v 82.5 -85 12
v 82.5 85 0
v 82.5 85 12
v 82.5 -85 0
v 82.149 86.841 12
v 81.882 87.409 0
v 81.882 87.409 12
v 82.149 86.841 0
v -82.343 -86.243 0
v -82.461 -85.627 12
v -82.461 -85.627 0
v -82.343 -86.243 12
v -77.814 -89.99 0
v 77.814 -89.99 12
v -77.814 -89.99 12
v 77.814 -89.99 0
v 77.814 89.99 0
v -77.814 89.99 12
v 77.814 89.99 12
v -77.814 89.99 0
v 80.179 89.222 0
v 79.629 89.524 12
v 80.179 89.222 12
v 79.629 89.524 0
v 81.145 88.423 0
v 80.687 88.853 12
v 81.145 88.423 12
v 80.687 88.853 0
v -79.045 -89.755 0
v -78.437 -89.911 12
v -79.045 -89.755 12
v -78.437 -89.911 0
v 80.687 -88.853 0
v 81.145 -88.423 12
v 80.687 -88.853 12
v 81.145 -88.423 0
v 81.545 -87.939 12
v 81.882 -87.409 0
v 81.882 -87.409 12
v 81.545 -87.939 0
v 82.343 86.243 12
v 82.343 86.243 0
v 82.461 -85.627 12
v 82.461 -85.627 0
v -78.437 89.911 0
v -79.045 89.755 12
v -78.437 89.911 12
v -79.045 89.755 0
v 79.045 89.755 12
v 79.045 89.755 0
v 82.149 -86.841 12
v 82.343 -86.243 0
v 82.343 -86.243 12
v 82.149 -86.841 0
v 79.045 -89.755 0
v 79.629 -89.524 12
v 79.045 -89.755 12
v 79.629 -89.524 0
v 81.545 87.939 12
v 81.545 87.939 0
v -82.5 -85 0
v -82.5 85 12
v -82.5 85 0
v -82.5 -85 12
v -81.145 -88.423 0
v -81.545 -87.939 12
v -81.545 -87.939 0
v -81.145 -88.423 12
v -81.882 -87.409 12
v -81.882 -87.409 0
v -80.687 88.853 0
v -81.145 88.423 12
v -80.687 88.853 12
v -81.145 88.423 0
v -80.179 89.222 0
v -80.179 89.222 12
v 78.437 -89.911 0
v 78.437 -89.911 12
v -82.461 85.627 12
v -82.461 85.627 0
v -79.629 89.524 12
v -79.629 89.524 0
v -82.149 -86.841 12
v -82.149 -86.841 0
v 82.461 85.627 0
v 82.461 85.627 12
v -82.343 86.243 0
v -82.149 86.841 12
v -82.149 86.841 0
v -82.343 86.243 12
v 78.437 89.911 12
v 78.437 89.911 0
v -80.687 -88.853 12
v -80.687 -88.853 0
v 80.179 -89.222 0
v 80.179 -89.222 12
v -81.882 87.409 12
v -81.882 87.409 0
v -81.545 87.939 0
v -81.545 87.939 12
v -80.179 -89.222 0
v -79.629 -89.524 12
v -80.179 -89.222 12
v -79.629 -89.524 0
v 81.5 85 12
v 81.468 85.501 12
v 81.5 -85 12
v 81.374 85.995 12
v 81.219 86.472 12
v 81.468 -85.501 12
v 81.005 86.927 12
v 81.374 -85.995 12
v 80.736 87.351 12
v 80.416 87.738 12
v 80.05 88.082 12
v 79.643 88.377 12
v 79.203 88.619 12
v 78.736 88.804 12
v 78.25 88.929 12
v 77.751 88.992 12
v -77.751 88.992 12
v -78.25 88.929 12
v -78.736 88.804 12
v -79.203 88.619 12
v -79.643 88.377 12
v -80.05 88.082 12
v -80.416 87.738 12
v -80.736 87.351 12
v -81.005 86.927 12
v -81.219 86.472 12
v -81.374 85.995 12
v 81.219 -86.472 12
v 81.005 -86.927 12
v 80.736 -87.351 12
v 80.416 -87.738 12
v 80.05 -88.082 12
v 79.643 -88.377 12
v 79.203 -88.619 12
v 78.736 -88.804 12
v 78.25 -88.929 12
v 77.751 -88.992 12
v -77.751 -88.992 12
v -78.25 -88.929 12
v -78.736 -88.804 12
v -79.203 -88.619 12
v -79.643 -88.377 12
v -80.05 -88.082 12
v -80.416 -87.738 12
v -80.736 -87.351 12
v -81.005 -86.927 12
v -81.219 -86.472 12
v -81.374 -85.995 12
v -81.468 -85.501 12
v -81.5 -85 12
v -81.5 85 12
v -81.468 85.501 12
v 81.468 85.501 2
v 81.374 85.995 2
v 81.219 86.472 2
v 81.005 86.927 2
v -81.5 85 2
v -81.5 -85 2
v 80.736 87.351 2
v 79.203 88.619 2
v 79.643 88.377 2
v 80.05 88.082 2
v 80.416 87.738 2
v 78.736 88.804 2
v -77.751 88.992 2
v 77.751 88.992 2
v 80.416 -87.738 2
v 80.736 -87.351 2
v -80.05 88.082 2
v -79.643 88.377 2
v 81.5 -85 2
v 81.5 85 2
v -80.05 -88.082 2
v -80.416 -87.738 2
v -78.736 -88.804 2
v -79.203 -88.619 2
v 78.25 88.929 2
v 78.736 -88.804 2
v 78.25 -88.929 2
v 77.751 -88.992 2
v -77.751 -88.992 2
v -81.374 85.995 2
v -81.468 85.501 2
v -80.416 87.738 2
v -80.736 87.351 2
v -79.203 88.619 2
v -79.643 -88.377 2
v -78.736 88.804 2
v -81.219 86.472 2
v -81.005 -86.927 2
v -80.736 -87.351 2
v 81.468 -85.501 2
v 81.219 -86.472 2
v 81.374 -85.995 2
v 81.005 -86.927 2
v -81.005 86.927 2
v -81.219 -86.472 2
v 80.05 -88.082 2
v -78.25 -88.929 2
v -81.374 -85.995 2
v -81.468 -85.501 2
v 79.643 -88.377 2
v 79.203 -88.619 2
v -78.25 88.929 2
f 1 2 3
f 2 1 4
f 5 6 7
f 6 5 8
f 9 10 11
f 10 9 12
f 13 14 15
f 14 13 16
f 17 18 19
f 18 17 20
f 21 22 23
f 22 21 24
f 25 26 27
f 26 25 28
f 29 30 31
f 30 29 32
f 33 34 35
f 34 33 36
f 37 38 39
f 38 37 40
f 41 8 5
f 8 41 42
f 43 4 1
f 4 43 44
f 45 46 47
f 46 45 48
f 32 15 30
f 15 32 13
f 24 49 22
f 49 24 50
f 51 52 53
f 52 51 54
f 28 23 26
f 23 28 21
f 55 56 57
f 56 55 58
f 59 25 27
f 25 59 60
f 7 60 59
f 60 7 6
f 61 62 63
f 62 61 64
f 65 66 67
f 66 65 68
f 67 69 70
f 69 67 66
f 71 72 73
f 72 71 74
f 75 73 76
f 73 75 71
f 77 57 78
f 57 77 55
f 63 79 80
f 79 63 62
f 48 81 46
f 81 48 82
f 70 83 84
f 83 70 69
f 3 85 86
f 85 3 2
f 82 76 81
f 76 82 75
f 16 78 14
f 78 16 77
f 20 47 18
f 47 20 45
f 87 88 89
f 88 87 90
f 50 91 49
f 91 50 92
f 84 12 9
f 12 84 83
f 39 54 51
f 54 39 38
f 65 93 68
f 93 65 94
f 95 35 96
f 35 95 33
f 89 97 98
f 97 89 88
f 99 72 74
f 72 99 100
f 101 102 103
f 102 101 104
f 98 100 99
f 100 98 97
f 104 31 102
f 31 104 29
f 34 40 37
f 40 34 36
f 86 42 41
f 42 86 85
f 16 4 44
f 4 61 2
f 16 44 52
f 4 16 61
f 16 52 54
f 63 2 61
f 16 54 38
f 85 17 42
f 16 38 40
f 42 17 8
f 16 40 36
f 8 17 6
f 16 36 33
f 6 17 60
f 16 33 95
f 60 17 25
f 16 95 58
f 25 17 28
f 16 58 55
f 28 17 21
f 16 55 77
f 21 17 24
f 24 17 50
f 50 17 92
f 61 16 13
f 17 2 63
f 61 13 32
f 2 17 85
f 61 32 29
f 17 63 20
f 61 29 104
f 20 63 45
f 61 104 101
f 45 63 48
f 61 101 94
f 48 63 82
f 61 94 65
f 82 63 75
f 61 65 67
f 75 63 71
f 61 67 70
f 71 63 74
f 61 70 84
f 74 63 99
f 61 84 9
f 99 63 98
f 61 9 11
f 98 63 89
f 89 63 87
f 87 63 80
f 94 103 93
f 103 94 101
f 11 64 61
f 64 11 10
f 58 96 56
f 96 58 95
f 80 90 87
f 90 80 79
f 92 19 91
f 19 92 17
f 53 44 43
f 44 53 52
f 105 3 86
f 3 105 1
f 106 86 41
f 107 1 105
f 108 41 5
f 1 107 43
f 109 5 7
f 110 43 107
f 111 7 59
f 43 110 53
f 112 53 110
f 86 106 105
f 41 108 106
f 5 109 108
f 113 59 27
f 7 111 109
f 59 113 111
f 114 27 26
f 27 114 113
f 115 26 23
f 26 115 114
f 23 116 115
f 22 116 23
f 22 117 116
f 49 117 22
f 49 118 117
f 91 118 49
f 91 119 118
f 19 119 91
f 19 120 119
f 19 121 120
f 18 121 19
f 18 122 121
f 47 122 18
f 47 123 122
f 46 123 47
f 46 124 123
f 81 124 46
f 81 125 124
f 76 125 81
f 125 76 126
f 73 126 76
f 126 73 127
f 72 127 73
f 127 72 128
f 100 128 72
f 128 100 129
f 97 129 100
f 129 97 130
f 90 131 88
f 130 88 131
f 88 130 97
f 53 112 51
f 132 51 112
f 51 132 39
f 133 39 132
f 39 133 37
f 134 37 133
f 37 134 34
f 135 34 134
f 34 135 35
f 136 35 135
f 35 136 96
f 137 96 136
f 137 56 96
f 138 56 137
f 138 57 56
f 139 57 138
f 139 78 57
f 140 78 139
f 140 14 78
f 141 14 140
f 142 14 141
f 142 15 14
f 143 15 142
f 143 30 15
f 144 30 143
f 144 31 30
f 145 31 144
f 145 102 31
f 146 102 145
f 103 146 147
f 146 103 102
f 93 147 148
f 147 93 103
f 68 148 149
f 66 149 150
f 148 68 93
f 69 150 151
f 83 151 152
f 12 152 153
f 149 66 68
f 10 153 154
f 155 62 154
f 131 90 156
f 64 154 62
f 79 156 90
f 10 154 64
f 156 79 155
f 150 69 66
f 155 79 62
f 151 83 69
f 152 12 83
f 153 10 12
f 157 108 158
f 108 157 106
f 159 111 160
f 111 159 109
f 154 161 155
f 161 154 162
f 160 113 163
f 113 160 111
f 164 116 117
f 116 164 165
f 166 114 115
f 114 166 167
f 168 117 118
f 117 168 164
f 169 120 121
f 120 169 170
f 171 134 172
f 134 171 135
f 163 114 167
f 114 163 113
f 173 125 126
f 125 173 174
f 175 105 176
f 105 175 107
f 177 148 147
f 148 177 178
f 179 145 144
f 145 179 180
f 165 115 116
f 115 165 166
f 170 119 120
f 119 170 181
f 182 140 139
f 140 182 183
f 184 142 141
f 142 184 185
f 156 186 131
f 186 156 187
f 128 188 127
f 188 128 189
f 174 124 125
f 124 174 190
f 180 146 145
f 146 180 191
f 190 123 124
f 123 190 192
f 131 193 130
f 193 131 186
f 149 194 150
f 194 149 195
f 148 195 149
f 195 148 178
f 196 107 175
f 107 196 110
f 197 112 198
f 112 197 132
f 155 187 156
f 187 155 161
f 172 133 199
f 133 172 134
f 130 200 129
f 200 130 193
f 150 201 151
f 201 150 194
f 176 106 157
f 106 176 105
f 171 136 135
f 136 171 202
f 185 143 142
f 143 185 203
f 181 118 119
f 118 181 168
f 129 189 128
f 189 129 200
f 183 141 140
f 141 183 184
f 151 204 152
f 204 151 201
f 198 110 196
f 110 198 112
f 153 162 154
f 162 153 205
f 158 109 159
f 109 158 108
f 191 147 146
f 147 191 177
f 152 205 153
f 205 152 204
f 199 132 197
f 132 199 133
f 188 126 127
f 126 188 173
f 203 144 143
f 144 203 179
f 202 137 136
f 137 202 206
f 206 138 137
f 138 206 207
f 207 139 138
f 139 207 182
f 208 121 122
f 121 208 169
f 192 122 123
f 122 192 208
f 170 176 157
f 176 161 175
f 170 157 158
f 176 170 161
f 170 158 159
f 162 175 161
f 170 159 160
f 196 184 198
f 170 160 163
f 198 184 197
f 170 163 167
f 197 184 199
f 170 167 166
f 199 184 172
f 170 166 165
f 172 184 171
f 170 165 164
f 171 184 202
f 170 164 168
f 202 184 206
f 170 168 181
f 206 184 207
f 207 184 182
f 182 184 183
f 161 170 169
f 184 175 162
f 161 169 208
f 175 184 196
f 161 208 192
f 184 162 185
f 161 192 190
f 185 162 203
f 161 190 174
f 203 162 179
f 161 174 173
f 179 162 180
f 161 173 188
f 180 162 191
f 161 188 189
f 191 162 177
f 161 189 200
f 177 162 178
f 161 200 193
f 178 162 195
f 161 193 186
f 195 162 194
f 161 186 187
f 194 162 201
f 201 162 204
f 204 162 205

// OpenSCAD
$fn = 50;


difference() {
	union() {
		hull() {
			translate(v = [-77.5000000000, 85.0000000000, 0]) {
				cylinder(h = 12, r = 5);
			}
			translate(v = [77.5000000000, 85.0000000000, 0]) {
				cylinder(h = 12, r = 5);
			}
			translate(v = [-77.5000000000, -85.0000000000, 0]) {
				cylinder(h = 12, r = 5);
			}
			translate(v = [77.5000000000, -85.0000000000, 0]) {
				cylinder(h = 12, r = 5);
			}
		}
	}
	union() {
		translate(v = [0, 0, 2]) {
			hull() {
				translate(v = [-77.5000000000, 85.0000000000, 0]) {
					cylinder(h = 10, r = 4);
				}
				translate(v = [77.5000000000, 85.0000000000, 0]) {
					cylinder(h = 10, r = 4);
				}
				translate(v = [-77.5000000000, -85.0000000000, 0]) {
					cylinder(h = 10, r = 4);
				}
				translate(v = [77.5000000000, -85.0000000000, 0]) {
					cylinder(h = 10, r = 4);
				}
			}
		}
	}
}
